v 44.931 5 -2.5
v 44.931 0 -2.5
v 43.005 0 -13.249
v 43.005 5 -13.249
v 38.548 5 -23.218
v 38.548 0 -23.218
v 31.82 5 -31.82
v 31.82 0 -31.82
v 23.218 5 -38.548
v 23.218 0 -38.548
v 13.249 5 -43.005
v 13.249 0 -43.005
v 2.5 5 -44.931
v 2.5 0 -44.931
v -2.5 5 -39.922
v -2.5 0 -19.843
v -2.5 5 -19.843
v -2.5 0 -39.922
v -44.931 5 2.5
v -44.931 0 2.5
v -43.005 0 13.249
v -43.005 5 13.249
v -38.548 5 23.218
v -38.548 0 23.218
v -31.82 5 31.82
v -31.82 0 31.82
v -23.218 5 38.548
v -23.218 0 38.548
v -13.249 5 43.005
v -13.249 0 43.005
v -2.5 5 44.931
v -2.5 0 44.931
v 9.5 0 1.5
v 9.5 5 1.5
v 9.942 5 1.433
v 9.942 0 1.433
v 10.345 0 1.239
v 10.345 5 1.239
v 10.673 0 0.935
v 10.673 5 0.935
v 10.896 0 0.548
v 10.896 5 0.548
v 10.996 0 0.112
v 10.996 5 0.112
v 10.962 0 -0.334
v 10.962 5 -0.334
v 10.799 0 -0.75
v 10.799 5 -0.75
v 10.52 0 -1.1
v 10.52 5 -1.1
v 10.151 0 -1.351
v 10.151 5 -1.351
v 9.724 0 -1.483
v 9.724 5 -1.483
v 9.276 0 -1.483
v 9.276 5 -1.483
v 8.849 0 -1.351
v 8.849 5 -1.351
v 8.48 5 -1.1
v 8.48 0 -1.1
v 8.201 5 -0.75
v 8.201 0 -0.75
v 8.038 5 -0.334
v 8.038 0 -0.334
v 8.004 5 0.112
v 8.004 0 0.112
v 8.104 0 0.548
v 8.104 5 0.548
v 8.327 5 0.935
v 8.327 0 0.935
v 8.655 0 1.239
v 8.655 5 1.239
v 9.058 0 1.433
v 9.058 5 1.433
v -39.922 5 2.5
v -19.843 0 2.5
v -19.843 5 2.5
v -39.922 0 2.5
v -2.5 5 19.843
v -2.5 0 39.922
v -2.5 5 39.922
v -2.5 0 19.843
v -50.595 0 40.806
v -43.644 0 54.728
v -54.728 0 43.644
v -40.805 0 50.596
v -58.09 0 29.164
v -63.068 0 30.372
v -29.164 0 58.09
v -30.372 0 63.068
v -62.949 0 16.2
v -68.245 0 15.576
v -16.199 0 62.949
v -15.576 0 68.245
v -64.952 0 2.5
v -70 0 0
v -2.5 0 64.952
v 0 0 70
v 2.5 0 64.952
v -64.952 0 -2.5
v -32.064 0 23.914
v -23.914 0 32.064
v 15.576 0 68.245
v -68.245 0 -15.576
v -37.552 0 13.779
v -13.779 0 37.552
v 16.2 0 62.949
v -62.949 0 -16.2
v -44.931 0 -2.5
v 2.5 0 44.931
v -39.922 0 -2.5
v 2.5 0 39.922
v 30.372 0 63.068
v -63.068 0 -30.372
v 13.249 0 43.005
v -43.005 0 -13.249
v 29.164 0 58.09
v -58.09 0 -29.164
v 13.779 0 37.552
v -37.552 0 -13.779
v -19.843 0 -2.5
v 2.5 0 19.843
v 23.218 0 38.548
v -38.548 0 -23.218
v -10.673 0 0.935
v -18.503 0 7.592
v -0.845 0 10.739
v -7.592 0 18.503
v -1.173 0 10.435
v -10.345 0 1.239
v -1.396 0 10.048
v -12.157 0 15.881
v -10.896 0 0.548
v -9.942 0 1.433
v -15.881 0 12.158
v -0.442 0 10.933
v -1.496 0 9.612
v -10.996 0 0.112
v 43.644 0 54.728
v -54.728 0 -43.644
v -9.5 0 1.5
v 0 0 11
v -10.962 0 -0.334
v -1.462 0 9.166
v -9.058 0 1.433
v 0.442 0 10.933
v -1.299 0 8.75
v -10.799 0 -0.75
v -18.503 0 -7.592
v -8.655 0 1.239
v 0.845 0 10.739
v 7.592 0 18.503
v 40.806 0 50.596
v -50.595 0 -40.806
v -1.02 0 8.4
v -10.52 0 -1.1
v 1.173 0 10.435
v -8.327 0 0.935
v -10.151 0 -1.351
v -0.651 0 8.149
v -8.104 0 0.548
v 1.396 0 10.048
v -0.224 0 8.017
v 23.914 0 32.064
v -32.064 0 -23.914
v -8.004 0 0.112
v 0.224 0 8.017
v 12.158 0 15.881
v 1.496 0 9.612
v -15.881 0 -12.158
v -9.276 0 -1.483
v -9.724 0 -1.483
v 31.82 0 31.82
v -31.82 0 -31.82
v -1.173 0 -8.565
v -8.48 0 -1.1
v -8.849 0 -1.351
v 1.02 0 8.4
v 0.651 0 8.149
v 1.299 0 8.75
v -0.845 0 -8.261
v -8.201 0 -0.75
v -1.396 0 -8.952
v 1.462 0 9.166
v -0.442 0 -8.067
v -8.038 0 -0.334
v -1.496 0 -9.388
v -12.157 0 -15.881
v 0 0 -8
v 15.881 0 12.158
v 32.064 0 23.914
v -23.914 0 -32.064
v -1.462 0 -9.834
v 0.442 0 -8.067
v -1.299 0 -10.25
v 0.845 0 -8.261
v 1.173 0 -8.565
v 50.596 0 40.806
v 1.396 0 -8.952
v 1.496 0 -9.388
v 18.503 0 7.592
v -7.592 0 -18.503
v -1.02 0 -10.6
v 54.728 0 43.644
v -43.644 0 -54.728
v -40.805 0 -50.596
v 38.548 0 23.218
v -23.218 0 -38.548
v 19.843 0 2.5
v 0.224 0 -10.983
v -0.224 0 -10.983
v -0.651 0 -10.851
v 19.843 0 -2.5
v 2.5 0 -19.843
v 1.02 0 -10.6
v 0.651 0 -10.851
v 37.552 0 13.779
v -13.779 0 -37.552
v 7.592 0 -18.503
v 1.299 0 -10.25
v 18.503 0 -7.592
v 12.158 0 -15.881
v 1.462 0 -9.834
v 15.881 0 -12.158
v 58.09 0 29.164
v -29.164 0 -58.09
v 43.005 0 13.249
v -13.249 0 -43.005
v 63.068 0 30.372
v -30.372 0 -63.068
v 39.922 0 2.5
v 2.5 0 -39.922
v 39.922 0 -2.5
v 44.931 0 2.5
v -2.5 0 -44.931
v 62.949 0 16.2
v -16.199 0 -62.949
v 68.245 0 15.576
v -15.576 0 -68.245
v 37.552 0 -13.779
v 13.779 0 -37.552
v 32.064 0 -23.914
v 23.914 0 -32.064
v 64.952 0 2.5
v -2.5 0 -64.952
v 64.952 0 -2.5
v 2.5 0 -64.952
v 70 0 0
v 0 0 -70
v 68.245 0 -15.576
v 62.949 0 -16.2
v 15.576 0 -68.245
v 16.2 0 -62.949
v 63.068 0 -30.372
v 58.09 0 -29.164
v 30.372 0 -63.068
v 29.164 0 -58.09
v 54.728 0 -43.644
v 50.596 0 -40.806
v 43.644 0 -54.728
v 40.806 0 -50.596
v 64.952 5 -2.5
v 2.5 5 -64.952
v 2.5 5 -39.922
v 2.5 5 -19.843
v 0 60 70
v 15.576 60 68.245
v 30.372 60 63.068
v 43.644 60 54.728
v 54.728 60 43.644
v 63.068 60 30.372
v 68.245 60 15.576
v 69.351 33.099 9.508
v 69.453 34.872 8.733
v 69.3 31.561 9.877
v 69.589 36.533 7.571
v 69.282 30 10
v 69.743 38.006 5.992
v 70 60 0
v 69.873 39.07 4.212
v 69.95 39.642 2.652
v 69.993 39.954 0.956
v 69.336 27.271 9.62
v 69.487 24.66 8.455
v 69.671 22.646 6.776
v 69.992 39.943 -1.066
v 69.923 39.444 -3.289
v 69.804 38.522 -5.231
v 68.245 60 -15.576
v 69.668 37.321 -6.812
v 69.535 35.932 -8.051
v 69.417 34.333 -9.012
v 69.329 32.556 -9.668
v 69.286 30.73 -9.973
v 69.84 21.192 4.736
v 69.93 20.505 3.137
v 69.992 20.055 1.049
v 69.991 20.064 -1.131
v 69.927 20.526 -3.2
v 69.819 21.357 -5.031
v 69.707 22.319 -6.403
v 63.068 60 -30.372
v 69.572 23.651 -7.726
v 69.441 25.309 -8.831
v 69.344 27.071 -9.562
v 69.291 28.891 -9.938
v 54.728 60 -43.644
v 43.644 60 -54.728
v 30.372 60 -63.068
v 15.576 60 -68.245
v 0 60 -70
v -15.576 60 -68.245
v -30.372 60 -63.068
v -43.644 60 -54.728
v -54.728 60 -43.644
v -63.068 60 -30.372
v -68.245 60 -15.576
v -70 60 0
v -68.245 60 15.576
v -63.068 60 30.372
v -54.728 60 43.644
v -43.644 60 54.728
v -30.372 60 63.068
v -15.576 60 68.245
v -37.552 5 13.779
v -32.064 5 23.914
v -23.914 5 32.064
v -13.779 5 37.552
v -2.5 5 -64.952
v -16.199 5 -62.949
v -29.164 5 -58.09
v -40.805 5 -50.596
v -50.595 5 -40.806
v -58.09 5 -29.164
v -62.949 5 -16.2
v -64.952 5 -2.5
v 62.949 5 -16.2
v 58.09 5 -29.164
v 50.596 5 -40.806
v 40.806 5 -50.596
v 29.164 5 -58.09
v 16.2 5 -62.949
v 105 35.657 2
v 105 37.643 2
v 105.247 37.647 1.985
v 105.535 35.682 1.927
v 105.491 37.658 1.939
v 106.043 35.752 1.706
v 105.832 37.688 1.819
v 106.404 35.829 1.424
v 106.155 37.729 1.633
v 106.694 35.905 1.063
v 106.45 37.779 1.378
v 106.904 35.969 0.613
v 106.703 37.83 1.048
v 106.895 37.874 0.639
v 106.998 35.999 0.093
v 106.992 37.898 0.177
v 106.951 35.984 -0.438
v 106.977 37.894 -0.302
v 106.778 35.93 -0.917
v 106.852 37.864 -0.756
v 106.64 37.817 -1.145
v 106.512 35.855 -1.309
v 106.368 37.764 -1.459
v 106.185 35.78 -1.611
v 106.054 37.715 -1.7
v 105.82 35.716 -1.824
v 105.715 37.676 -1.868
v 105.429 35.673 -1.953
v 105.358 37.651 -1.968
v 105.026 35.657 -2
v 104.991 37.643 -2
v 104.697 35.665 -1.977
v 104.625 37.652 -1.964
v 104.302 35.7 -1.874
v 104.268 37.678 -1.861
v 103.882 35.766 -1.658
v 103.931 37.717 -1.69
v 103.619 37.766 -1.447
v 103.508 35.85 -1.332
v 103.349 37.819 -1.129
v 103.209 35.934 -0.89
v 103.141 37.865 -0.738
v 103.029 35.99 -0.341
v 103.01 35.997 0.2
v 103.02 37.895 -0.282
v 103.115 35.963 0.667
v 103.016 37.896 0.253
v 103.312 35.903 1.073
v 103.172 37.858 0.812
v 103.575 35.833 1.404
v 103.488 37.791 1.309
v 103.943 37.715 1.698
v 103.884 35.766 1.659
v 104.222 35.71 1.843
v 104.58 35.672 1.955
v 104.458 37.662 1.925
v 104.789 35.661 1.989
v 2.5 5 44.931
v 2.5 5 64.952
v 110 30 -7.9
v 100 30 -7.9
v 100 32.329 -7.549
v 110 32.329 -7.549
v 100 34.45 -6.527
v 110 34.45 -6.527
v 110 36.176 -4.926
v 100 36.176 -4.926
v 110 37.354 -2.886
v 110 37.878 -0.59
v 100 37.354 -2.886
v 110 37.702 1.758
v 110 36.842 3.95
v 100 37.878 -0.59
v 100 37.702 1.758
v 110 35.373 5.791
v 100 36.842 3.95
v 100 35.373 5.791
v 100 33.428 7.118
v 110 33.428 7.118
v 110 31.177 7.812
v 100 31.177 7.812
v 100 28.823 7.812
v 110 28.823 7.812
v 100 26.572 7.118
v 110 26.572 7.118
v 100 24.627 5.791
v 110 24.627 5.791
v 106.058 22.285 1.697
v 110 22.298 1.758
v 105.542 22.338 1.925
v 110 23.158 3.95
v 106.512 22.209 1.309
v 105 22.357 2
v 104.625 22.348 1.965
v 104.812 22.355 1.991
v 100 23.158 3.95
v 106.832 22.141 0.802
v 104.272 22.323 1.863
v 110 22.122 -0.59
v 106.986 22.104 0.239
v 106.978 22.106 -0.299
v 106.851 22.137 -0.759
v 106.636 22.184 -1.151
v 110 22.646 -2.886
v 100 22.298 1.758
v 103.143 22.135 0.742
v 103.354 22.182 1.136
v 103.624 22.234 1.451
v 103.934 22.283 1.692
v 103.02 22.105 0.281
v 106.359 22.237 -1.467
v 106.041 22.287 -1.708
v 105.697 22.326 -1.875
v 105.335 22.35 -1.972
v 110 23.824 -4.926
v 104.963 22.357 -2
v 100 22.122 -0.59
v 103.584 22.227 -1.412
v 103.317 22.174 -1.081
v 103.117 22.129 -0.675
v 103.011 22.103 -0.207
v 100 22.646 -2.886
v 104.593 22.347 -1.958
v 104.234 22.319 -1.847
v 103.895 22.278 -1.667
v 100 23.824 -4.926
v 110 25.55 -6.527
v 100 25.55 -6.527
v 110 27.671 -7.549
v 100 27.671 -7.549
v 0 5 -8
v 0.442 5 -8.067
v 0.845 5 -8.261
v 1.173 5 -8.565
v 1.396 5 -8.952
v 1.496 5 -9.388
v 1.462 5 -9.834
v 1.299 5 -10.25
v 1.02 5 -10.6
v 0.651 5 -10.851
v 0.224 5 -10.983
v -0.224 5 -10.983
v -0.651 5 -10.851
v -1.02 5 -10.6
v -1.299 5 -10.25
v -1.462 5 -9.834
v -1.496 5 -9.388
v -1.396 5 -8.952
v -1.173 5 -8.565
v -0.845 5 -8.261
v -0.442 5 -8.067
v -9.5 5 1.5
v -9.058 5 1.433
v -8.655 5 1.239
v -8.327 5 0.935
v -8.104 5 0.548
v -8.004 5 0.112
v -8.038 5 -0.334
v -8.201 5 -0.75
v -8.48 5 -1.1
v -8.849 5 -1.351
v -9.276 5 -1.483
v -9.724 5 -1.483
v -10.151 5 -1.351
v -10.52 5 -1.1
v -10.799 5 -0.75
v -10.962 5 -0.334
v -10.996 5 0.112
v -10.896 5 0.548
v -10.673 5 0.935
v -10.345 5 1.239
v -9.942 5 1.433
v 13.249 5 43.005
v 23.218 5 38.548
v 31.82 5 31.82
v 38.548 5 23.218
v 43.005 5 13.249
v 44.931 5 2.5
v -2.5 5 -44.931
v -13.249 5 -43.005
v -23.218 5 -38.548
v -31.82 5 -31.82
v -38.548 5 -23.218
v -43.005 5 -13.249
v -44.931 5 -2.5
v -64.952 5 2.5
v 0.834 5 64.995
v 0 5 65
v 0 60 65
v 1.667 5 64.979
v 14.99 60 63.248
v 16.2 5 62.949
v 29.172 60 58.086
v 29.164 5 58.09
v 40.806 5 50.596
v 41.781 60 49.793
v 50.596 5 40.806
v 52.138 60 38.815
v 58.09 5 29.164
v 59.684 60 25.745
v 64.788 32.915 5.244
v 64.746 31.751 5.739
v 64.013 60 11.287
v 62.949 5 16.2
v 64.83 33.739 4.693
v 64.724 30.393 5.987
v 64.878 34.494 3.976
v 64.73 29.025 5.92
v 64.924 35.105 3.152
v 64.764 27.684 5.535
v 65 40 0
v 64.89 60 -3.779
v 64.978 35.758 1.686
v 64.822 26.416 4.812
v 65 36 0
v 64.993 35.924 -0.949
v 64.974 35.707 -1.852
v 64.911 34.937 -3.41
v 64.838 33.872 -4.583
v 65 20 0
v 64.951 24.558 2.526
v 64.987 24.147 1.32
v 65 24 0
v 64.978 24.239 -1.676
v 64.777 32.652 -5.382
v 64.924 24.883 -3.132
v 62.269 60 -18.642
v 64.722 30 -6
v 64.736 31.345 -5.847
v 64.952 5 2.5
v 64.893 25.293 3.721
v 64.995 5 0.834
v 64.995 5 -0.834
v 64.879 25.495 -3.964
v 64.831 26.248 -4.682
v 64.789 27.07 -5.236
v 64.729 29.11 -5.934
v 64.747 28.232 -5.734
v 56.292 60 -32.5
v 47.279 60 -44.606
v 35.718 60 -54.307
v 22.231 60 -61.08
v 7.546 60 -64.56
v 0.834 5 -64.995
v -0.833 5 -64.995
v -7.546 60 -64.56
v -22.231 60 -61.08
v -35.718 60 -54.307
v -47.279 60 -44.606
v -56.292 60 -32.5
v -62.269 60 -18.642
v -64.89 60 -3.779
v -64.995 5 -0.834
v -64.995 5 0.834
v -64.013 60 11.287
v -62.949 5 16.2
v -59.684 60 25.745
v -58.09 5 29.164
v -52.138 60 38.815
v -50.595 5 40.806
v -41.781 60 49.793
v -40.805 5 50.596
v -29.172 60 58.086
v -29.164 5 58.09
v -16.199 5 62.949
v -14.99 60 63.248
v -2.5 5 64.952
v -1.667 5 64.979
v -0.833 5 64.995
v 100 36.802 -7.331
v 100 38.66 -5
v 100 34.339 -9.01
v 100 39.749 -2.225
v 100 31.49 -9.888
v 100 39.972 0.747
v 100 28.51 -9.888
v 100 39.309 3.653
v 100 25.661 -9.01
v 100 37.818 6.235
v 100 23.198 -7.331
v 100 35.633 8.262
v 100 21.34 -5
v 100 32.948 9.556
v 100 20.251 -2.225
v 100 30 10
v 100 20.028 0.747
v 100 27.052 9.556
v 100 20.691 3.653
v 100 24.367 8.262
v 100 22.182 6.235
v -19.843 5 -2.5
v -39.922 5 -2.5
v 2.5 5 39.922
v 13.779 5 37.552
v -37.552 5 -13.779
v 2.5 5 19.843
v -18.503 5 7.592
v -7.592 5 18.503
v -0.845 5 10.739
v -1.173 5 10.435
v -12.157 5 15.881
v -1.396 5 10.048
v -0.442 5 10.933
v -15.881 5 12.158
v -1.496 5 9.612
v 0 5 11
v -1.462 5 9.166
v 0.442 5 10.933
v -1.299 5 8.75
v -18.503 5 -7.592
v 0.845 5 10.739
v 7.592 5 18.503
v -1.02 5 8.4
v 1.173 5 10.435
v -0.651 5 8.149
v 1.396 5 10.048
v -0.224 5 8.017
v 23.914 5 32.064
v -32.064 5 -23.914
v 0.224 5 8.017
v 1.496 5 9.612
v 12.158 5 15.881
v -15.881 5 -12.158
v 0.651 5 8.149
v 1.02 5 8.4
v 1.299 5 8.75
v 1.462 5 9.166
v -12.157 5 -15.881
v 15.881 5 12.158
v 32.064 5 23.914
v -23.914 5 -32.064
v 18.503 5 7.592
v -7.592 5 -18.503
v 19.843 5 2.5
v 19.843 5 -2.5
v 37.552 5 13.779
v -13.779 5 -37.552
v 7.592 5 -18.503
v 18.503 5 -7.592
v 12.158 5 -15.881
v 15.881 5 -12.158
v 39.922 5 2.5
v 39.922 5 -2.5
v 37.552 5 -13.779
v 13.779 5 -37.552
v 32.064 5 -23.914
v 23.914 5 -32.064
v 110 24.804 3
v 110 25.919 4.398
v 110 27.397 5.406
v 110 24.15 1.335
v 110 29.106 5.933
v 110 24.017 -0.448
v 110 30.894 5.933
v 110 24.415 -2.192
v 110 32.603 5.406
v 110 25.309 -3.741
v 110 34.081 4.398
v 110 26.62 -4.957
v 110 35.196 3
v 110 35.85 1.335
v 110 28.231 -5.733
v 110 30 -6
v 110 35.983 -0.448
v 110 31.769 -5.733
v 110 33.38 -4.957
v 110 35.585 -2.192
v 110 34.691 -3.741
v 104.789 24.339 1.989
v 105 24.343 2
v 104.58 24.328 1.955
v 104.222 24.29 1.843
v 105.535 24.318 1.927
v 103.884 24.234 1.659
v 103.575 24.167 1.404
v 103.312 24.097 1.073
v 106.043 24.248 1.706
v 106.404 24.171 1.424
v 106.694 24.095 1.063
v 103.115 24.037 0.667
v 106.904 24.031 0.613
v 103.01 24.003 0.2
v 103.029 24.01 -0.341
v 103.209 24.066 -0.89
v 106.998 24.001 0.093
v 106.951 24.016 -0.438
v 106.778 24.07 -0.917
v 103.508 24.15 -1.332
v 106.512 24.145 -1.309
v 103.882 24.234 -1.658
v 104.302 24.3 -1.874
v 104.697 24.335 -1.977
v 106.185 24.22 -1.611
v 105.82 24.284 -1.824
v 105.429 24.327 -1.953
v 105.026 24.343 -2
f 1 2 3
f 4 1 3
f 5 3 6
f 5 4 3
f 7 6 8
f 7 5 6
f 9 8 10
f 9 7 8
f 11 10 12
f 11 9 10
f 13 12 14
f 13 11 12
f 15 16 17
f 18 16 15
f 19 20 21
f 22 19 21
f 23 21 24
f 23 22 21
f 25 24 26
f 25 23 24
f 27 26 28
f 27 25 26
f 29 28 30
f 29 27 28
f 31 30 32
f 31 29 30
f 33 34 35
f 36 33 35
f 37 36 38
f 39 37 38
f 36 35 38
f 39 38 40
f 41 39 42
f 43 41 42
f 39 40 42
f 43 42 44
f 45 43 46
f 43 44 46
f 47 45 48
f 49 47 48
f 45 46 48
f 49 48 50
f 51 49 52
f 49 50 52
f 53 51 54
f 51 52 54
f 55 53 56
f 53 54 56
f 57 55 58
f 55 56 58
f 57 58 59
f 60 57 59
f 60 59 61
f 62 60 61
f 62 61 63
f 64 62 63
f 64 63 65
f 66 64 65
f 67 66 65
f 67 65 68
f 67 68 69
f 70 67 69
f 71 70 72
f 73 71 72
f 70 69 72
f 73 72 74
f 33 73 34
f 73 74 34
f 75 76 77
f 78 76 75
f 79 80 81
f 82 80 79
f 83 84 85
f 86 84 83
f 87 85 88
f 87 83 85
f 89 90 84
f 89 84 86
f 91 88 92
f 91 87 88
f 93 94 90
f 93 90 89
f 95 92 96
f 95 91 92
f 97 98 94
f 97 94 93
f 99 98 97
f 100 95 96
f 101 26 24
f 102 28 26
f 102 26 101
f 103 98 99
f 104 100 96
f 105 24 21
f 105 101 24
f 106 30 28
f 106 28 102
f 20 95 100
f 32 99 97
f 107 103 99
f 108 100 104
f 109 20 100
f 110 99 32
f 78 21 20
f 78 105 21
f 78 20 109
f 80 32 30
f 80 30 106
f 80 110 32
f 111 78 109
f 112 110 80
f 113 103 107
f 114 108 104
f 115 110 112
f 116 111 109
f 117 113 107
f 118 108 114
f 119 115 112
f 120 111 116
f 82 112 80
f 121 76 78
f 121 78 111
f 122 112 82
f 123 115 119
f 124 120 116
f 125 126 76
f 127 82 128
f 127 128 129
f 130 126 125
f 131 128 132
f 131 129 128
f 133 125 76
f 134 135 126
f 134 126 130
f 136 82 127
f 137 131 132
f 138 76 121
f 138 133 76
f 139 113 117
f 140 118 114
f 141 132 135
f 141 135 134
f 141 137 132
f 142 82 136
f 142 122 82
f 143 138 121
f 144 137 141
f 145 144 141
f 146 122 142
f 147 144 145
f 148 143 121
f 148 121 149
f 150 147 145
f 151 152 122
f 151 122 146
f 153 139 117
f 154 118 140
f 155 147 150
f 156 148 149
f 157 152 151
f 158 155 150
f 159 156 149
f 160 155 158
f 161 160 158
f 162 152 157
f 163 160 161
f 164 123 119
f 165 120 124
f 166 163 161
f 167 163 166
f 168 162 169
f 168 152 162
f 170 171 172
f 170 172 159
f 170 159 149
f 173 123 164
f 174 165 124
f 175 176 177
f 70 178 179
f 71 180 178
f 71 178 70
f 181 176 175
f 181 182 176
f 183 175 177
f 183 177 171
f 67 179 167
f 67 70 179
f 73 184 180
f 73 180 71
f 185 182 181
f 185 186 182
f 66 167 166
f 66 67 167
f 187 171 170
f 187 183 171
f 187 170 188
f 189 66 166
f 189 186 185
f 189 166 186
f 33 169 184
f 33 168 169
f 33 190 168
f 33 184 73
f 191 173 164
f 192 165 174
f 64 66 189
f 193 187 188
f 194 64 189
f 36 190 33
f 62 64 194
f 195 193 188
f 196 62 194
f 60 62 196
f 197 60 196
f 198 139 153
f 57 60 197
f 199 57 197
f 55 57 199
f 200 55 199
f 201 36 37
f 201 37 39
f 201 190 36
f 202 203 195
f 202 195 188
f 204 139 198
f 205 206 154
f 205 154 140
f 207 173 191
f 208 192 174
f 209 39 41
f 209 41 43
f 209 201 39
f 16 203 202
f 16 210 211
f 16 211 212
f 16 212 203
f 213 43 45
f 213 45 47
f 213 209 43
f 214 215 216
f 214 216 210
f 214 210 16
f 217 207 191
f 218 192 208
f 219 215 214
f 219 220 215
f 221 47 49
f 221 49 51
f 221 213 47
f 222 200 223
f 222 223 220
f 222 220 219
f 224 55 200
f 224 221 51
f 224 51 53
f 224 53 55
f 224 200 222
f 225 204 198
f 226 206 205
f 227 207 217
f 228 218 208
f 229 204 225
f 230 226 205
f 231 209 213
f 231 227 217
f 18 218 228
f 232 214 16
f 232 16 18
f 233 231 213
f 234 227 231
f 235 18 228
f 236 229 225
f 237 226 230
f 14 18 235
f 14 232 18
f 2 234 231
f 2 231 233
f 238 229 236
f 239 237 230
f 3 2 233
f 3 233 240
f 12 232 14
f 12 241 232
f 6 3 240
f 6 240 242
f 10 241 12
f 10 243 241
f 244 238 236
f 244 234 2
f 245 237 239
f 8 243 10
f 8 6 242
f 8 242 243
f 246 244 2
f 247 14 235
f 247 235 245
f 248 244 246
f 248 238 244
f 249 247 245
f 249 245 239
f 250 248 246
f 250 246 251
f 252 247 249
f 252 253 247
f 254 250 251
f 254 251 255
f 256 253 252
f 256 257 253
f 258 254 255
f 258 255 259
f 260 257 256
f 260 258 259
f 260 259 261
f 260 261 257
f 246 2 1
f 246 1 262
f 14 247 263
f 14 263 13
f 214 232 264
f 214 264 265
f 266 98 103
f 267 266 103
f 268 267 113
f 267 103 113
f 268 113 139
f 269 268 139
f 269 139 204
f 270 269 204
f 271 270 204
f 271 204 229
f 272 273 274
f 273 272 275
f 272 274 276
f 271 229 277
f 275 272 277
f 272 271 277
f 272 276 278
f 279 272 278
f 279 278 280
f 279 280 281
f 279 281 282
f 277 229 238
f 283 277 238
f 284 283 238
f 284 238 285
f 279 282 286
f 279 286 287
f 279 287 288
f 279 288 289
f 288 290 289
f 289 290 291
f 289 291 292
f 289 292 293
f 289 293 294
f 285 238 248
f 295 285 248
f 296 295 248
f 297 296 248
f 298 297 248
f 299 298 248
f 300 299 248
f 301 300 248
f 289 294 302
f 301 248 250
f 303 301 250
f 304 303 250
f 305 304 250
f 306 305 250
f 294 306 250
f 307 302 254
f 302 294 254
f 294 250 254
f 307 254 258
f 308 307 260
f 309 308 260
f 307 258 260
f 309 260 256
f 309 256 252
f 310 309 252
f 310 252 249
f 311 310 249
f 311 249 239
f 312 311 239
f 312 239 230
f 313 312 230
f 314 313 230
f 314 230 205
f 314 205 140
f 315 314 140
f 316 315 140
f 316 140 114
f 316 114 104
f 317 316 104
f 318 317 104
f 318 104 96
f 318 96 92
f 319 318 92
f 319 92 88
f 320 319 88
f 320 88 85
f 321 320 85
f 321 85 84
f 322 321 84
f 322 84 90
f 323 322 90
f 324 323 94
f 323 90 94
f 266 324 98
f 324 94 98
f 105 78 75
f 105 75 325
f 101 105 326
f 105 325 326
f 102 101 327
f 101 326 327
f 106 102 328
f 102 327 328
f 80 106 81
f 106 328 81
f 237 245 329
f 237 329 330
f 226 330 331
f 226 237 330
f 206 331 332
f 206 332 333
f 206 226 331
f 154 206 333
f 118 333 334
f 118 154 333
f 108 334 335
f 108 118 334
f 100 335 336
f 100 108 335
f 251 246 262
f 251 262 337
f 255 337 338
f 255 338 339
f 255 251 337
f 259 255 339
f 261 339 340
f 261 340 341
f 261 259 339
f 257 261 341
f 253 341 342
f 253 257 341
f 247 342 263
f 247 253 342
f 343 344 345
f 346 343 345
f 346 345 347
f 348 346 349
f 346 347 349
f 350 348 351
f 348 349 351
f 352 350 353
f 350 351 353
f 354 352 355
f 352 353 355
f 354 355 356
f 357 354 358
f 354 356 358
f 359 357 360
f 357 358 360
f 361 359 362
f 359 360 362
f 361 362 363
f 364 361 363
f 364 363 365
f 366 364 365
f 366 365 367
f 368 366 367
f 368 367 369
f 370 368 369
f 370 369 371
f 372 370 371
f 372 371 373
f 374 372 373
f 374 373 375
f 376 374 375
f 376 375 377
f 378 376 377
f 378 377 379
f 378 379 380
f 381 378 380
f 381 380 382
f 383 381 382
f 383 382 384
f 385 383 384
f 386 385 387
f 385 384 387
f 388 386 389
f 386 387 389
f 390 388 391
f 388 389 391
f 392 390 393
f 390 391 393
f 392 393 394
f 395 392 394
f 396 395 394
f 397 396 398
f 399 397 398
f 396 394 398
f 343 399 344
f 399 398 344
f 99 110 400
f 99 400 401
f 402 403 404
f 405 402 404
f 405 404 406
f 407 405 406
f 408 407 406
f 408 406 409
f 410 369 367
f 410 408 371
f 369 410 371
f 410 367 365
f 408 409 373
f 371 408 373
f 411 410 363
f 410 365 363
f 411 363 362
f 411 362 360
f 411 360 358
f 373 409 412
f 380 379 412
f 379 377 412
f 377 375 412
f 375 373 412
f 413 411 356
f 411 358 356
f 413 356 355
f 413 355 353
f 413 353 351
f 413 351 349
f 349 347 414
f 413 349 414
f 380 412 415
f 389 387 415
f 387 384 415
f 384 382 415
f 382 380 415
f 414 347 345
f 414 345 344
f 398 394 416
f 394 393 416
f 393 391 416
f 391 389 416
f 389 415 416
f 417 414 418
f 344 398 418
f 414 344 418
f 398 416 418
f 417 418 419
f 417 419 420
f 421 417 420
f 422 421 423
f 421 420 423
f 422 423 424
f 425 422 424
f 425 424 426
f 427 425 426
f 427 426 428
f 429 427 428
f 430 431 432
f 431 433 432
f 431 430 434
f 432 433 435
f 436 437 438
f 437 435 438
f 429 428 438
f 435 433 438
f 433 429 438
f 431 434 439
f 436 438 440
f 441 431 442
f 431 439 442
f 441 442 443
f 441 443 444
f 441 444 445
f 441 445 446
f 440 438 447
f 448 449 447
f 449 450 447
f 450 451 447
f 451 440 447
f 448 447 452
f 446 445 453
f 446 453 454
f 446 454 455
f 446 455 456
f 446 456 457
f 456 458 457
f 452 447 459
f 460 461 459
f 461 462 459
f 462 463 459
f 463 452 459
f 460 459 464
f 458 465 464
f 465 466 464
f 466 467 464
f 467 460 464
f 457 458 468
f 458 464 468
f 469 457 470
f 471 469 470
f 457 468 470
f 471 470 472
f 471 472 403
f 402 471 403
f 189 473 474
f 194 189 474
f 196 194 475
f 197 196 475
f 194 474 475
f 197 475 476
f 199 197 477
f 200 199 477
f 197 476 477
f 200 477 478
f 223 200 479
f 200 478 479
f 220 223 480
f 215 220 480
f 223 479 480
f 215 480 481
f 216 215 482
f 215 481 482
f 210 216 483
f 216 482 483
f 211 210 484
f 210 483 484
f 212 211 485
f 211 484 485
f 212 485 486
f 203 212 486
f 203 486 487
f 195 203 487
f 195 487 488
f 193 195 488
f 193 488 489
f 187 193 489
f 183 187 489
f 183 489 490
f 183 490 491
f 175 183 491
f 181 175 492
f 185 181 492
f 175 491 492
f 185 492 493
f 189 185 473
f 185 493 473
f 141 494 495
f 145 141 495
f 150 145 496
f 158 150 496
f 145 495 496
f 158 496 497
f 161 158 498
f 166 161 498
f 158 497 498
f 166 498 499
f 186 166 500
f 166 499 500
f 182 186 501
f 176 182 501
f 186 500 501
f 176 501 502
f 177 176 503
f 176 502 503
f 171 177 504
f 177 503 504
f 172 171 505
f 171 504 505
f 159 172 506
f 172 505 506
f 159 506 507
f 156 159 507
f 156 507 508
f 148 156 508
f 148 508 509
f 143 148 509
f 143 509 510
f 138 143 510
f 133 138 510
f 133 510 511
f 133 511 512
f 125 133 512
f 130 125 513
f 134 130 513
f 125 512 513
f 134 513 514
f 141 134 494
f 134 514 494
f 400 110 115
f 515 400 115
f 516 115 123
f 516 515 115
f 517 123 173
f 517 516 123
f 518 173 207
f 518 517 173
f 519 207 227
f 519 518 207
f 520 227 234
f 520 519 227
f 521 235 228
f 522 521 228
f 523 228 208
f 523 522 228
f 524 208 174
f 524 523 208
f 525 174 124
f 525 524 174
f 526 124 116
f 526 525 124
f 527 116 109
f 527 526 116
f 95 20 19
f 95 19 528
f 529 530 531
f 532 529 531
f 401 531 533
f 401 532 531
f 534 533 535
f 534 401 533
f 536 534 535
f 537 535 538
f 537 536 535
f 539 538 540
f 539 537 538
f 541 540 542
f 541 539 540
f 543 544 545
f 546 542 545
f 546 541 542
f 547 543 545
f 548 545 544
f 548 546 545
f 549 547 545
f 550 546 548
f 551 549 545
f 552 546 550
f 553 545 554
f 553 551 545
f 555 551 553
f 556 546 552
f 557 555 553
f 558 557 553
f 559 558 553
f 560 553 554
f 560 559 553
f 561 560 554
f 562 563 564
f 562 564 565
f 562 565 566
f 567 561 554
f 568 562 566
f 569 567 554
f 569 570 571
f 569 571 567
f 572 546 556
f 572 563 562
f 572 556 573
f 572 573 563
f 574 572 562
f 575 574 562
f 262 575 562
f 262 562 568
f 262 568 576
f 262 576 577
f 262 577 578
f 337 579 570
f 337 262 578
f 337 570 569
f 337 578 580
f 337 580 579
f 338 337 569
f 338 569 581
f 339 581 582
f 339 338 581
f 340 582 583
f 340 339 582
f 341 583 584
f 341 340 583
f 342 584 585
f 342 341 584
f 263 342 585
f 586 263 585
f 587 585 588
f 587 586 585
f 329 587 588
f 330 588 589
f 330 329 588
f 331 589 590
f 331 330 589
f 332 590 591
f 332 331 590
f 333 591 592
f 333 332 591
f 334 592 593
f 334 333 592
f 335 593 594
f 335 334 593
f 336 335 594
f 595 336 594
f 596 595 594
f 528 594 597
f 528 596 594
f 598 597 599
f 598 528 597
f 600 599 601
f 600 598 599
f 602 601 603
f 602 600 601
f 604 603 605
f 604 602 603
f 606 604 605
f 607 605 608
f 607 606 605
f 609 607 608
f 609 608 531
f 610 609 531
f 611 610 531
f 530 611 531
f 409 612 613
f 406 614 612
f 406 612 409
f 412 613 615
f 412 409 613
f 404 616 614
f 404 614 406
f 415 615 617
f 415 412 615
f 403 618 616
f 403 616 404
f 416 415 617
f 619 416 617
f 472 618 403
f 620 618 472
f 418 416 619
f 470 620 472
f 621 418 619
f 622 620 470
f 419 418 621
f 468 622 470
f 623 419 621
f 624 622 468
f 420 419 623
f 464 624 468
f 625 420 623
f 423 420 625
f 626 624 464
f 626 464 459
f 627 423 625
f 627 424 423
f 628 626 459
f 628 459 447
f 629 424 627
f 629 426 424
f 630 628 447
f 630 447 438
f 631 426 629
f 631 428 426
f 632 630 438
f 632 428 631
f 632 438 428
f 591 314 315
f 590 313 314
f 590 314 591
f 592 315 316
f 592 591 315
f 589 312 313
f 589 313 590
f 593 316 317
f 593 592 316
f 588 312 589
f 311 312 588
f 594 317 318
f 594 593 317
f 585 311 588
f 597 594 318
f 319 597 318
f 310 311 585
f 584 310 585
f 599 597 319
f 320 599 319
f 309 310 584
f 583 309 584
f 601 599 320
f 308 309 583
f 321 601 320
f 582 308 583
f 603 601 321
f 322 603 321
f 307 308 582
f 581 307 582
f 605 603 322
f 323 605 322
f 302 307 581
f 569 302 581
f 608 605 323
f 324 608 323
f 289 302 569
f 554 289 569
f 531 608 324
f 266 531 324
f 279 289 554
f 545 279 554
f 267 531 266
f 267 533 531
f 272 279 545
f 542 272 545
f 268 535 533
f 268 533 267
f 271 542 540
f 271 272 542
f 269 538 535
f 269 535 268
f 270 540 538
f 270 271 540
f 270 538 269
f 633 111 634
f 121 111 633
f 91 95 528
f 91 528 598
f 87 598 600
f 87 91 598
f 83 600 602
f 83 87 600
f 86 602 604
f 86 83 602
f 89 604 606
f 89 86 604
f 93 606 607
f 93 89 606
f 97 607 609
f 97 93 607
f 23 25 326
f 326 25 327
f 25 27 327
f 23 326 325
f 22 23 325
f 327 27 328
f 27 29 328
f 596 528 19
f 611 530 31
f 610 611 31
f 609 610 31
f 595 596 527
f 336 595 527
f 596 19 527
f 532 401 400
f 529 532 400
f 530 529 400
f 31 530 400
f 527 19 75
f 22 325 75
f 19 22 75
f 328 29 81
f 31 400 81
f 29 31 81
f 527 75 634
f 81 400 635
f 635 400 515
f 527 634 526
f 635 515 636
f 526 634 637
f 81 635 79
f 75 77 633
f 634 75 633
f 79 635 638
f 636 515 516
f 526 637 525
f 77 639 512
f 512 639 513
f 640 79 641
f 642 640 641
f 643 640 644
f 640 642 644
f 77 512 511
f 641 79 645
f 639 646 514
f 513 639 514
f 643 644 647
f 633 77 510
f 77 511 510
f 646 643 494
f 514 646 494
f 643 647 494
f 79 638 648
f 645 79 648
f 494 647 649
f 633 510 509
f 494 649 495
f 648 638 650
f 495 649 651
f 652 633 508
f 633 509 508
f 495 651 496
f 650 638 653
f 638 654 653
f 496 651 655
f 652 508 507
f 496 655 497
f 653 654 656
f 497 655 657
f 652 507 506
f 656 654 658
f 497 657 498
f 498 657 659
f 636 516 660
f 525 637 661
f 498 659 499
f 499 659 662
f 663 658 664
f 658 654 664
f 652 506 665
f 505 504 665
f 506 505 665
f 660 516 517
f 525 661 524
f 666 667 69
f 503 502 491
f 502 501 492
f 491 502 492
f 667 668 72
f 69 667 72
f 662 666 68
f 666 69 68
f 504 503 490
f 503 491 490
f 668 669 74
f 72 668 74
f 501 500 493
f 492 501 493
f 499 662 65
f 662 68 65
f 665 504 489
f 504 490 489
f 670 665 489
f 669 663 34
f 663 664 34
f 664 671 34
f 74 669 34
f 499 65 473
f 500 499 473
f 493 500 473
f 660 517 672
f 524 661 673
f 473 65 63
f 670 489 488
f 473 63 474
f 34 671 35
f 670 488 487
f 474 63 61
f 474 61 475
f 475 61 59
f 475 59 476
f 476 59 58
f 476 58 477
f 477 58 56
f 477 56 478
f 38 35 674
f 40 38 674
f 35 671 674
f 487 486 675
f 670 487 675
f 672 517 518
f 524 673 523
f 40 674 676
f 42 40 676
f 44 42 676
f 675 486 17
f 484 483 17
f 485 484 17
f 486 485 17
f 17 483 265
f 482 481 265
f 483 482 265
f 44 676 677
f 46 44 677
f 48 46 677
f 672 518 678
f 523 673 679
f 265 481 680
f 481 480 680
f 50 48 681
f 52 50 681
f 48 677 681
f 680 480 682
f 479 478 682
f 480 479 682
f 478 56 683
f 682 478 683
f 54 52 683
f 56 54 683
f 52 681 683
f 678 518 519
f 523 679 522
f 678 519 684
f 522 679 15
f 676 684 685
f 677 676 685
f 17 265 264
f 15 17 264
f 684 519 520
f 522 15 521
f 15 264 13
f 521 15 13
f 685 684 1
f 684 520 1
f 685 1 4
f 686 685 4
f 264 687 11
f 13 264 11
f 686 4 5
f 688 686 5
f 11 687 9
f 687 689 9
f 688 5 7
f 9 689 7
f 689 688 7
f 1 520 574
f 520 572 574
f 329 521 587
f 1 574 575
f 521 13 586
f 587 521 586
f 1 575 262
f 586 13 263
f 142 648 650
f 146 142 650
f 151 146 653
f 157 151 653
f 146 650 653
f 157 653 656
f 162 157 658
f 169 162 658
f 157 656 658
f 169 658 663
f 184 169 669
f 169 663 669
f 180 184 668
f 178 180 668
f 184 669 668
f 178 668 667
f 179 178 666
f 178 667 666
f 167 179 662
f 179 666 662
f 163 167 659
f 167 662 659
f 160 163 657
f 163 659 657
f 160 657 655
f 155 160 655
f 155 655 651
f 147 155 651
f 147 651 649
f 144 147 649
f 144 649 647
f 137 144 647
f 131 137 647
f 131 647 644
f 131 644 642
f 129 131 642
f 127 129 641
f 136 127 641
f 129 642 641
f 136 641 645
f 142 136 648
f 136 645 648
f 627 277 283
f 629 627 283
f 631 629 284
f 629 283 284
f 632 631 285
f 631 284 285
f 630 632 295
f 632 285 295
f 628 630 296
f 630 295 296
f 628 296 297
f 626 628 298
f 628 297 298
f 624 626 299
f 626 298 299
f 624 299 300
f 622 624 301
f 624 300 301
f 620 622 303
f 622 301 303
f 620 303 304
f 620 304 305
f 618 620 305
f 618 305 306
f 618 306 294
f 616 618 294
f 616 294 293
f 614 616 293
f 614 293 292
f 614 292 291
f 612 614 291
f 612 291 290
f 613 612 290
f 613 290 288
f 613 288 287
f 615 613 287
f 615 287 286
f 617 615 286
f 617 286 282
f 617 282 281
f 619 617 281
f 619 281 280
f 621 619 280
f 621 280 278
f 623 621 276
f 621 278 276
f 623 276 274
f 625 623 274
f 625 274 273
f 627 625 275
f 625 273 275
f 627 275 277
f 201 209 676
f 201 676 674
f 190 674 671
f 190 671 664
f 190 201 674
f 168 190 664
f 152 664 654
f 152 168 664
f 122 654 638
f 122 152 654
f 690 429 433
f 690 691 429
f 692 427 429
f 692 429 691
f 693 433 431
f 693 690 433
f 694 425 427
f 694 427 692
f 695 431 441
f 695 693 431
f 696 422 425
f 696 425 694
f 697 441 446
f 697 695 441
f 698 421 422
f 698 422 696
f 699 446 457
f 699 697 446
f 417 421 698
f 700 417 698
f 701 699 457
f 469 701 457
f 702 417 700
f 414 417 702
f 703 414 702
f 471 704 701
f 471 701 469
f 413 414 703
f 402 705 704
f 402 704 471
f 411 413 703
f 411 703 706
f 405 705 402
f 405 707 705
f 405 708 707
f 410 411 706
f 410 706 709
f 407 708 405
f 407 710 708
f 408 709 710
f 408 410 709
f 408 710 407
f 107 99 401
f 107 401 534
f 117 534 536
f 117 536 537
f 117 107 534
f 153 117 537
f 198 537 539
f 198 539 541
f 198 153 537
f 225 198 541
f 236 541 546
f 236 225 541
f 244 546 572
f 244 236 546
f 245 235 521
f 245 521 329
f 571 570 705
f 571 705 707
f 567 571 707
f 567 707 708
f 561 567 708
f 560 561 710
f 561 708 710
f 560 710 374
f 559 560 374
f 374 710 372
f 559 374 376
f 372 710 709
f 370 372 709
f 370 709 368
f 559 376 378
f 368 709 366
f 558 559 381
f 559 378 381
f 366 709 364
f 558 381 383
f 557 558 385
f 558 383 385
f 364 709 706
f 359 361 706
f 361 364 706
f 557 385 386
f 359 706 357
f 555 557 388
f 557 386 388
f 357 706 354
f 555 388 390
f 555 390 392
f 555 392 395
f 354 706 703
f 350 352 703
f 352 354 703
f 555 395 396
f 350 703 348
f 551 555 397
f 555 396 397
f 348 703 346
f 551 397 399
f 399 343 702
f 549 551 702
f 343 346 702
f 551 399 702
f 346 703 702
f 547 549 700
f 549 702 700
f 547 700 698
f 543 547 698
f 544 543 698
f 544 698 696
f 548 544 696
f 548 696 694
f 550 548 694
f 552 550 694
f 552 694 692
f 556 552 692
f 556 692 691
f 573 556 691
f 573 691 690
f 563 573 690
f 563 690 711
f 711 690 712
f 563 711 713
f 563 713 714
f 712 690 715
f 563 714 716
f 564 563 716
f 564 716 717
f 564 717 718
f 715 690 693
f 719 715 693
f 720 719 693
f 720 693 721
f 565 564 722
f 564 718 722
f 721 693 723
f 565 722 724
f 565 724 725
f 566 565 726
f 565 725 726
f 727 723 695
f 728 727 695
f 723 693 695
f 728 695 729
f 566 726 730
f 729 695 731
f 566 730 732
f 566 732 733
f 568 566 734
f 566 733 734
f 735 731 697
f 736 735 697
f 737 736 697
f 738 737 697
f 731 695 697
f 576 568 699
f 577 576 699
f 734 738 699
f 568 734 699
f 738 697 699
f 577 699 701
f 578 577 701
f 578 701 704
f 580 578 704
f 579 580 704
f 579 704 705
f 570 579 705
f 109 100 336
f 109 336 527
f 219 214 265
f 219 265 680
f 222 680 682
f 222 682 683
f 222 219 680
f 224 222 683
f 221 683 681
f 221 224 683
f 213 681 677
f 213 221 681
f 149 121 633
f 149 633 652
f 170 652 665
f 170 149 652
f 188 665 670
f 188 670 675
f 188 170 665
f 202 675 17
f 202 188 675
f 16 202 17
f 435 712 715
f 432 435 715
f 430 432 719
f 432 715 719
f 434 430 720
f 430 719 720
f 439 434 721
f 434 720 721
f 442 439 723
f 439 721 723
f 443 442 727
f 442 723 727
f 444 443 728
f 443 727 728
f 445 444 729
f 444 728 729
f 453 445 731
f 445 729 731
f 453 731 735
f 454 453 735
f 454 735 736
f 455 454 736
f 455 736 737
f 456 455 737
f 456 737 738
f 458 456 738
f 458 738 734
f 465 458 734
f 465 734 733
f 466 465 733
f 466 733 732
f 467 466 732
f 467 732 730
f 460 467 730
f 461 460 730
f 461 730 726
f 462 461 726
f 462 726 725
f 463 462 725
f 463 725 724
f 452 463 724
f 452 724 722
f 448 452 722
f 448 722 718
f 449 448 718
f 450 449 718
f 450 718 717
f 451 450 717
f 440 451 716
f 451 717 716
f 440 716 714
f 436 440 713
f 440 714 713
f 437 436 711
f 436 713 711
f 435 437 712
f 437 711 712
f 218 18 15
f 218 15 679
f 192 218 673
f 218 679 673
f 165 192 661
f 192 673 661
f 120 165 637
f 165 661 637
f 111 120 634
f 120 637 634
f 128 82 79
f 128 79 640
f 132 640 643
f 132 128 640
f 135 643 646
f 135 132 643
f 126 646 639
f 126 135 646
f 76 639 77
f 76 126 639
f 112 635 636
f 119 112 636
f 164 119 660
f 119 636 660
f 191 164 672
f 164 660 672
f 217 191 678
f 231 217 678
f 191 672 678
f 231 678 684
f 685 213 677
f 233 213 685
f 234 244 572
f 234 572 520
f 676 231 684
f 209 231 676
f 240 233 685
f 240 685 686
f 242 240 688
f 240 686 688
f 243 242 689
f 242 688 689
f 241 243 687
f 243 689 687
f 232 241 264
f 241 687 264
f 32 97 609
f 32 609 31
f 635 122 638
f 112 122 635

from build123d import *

# Parameters (mm, degrees)
SKETCH1_R                = 70
SKETCH1_R_2              = 65
BOSS_EXTRUDE2_DEPTH      = 60
SKETCH3_R                = 65
BOSS_EXTRUDE4_DEPTH      = 5
CUT_EXTRUDE1_START       = -5
CUT_EXTRUDE1_DEPTH       = 5
SKETCH5_R                = 1.5
CUT_EXTRUDE2_DEPTH       = 5
SKETCH6_R                = 45
SKETCH6_R_2              = 40
BOSS_EXTRUDE5_DEPTH      = 5
BOSS_EXTRUDE7_DEPTH      = 30
BOSS_EXTRUDE7_DEPTH_BACK = 5
SKETCH8_R                = 10
SKETCH10_R               = 7.9
BOSS_EXTRUDE8_DEPTH      = 10
SKETCH11_R               = 6
CUT_EXTRUDE4_DEPTH       = 50
SKETCH13_R               = 2
CUT_EXTRUDE5_DEPTH       = 50


with BuildPart() as part:
    # Sketch1 → Boss-Extrude2 (new body)
    with BuildSketch(Plane(origin=(0, 0, 0), x_dir=(1, 0, 0), z_dir=(0, 1, 0))):
        Circle(SKETCH1_R)
        Circle(SKETCH1_R_2, mode=Mode.SUBTRACT)
    extrude(amount=BOSS_EXTRUDE2_DEPTH)

    # Sketch3 → Boss-Extrude4 (add)
    with BuildSketch(Plane(origin=(0, 0, 0), x_dir=(-1, 0, 0), z_dir=(0, -1, 0))):
        Circle(SKETCH3_R)
    extrude(amount=-BOSS_EXTRUDE4_DEPTH)

    # Sketch4 → Cut-Extrude1 (cut)
    with BuildSketch(Plane(origin=(0, 5, 0), x_dir=(1, 0, 0), z_dir=(0, 1, 0)).offset(CUT_EXTRUDE1_START)):
        with BuildLine():
            ThreePointArc((2.5, 19.843134833), (14.142135624, 14.142135624), (19.843134833, 2.5))
            Line((19.843134833, 2.5), (64.951905284, 2.5))
            ThreePointArc((64.951905284, 2.5), (45.961940777, 45.961940777), (2.5, 64.951905284))
            Line((2.5, 64.951905284), (2.5, 19.843134833))
        make_face()
        with BuildLine():
            Line((64.951905284, -2.5), (19.843134833, -2.5))
            ThreePointArc((19.843134833, -2.5), (14.142135624, -14.142135624), (2.5, -19.843134833))
            Line((2.5, -19.843134833), (2.5, -64.951905284))
            ThreePointArc((2.5, -64.951905284), (45.961940777, -45.961940777), (64.951905284, -2.5))
        make_face()
        with BuildLine():
            ThreePointArc((-19.843134833, 2.5), (-14.141970876, 14.14230037), (-2.499537679, 19.843193074))
            Line((-2.499537679, 19.843193074), (-2.499537679, 64.951923077))
            ThreePointArc((-2.499537679, 64.951923077), (-45.961777201, 45.962104353), (-64.951905284, 2.5))
            Line((-64.951905284, 2.5), (-19.843134833, 2.5))
        make_face()
        with BuildLine():
            Line((-2.499537679, -64.951923077), (-2.499537679, -19.843193074))
            ThreePointArc((-2.499537679, -19.843193074), (-14.141970876, -14.14230037), (-19.843134833, -2.5))
            Line((-19.843134833, -2.5), (-64.951905284, -2.5))
            ThreePointArc((-64.951905284, -2.5), (-45.961777201, -45.962104353), (-2.499537679, -64.951923077))
        make_face()
    extrude(amount=CUT_EXTRUDE1_DEPTH, mode=Mode.SUBTRACT)

    # Sketch5 → Cut-Extrude2 (cut)
    with BuildSketch(Plane(origin=(0, 5, 0), x_dir=(1, 0, 0), z_dir=(0, 1, 0))):
        with Locations((9.5, 0)):
            Circle(SKETCH5_R)
        with Locations((-9.5, 0)):
            Circle(SKETCH5_R)
        with Locations((0, 9.5)):
            Circle(SKETCH5_R)
        with Locations((0, -9.5)):
            Circle(SKETCH5_R)
    extrude(amount=-CUT_EXTRUDE2_DEPTH, mode=Mode.SUBTRACT)

    # Sketch6 → Boss-Extrude5 (add)
    with BuildSketch(Plane(origin=(0, 5, 0), x_dir=(1, 0, 0), z_dir=(0, 1, 0))):
        Circle(SKETCH6_R)
        Circle(SKETCH6_R_2, mode=Mode.SUBTRACT)
    extrude(amount=-BOSS_EXTRUDE5_DEPTH)

    # Sketch8 → Boss-Extrude7 (add, two sides: drawn at the far end of the back side and taken through both)
    with BuildSketch(Plane(origin=(70, 0, 0), x_dir=(0, 0, -1), z_dir=(1, 0, 0)).offset(-BOSS_EXTRUDE7_DEPTH_BACK)):
        with Locations((0, 30)):
            Circle(SKETCH8_R)
    extrude(amount=BOSS_EXTRUDE7_DEPTH + BOSS_EXTRUDE7_DEPTH_BACK)

    # Sketch10 → Boss-Extrude8 (add)
    with BuildSketch(Plane(origin=(100, 0, 0), x_dir=(0, 0, -1), z_dir=(1, 0, 0))):
        with Locations((0, 30)):
            Circle(SKETCH10_R)
    extrude(amount=BOSS_EXTRUDE8_DEPTH)

    # Sketch11 → Cut-Extrude4 (cut)
    with BuildSketch(Plane(origin=(110, 0, 0), x_dir=(0, 0, -1), z_dir=(1, 0, 0))):
        with Locations((0, 30)):
            Circle(SKETCH11_R)
    extrude(amount=-CUT_EXTRUDE4_DEPTH, mode=Mode.SUBTRACT)

    # Sketch13 → Cut-Extrude5 (cut)
    with BuildSketch(Plane(origin=(110, 37.9, 0), x_dir=(1, 0, 0), z_dir=(0, 1, 0))):
        with Locations((-5, 0)):
            Circle(SKETCH13_R)
    extrude(amount=-CUT_EXTRUDE5_DEPTH, mode=Mode.SUBTRACT)


solid = part.part
